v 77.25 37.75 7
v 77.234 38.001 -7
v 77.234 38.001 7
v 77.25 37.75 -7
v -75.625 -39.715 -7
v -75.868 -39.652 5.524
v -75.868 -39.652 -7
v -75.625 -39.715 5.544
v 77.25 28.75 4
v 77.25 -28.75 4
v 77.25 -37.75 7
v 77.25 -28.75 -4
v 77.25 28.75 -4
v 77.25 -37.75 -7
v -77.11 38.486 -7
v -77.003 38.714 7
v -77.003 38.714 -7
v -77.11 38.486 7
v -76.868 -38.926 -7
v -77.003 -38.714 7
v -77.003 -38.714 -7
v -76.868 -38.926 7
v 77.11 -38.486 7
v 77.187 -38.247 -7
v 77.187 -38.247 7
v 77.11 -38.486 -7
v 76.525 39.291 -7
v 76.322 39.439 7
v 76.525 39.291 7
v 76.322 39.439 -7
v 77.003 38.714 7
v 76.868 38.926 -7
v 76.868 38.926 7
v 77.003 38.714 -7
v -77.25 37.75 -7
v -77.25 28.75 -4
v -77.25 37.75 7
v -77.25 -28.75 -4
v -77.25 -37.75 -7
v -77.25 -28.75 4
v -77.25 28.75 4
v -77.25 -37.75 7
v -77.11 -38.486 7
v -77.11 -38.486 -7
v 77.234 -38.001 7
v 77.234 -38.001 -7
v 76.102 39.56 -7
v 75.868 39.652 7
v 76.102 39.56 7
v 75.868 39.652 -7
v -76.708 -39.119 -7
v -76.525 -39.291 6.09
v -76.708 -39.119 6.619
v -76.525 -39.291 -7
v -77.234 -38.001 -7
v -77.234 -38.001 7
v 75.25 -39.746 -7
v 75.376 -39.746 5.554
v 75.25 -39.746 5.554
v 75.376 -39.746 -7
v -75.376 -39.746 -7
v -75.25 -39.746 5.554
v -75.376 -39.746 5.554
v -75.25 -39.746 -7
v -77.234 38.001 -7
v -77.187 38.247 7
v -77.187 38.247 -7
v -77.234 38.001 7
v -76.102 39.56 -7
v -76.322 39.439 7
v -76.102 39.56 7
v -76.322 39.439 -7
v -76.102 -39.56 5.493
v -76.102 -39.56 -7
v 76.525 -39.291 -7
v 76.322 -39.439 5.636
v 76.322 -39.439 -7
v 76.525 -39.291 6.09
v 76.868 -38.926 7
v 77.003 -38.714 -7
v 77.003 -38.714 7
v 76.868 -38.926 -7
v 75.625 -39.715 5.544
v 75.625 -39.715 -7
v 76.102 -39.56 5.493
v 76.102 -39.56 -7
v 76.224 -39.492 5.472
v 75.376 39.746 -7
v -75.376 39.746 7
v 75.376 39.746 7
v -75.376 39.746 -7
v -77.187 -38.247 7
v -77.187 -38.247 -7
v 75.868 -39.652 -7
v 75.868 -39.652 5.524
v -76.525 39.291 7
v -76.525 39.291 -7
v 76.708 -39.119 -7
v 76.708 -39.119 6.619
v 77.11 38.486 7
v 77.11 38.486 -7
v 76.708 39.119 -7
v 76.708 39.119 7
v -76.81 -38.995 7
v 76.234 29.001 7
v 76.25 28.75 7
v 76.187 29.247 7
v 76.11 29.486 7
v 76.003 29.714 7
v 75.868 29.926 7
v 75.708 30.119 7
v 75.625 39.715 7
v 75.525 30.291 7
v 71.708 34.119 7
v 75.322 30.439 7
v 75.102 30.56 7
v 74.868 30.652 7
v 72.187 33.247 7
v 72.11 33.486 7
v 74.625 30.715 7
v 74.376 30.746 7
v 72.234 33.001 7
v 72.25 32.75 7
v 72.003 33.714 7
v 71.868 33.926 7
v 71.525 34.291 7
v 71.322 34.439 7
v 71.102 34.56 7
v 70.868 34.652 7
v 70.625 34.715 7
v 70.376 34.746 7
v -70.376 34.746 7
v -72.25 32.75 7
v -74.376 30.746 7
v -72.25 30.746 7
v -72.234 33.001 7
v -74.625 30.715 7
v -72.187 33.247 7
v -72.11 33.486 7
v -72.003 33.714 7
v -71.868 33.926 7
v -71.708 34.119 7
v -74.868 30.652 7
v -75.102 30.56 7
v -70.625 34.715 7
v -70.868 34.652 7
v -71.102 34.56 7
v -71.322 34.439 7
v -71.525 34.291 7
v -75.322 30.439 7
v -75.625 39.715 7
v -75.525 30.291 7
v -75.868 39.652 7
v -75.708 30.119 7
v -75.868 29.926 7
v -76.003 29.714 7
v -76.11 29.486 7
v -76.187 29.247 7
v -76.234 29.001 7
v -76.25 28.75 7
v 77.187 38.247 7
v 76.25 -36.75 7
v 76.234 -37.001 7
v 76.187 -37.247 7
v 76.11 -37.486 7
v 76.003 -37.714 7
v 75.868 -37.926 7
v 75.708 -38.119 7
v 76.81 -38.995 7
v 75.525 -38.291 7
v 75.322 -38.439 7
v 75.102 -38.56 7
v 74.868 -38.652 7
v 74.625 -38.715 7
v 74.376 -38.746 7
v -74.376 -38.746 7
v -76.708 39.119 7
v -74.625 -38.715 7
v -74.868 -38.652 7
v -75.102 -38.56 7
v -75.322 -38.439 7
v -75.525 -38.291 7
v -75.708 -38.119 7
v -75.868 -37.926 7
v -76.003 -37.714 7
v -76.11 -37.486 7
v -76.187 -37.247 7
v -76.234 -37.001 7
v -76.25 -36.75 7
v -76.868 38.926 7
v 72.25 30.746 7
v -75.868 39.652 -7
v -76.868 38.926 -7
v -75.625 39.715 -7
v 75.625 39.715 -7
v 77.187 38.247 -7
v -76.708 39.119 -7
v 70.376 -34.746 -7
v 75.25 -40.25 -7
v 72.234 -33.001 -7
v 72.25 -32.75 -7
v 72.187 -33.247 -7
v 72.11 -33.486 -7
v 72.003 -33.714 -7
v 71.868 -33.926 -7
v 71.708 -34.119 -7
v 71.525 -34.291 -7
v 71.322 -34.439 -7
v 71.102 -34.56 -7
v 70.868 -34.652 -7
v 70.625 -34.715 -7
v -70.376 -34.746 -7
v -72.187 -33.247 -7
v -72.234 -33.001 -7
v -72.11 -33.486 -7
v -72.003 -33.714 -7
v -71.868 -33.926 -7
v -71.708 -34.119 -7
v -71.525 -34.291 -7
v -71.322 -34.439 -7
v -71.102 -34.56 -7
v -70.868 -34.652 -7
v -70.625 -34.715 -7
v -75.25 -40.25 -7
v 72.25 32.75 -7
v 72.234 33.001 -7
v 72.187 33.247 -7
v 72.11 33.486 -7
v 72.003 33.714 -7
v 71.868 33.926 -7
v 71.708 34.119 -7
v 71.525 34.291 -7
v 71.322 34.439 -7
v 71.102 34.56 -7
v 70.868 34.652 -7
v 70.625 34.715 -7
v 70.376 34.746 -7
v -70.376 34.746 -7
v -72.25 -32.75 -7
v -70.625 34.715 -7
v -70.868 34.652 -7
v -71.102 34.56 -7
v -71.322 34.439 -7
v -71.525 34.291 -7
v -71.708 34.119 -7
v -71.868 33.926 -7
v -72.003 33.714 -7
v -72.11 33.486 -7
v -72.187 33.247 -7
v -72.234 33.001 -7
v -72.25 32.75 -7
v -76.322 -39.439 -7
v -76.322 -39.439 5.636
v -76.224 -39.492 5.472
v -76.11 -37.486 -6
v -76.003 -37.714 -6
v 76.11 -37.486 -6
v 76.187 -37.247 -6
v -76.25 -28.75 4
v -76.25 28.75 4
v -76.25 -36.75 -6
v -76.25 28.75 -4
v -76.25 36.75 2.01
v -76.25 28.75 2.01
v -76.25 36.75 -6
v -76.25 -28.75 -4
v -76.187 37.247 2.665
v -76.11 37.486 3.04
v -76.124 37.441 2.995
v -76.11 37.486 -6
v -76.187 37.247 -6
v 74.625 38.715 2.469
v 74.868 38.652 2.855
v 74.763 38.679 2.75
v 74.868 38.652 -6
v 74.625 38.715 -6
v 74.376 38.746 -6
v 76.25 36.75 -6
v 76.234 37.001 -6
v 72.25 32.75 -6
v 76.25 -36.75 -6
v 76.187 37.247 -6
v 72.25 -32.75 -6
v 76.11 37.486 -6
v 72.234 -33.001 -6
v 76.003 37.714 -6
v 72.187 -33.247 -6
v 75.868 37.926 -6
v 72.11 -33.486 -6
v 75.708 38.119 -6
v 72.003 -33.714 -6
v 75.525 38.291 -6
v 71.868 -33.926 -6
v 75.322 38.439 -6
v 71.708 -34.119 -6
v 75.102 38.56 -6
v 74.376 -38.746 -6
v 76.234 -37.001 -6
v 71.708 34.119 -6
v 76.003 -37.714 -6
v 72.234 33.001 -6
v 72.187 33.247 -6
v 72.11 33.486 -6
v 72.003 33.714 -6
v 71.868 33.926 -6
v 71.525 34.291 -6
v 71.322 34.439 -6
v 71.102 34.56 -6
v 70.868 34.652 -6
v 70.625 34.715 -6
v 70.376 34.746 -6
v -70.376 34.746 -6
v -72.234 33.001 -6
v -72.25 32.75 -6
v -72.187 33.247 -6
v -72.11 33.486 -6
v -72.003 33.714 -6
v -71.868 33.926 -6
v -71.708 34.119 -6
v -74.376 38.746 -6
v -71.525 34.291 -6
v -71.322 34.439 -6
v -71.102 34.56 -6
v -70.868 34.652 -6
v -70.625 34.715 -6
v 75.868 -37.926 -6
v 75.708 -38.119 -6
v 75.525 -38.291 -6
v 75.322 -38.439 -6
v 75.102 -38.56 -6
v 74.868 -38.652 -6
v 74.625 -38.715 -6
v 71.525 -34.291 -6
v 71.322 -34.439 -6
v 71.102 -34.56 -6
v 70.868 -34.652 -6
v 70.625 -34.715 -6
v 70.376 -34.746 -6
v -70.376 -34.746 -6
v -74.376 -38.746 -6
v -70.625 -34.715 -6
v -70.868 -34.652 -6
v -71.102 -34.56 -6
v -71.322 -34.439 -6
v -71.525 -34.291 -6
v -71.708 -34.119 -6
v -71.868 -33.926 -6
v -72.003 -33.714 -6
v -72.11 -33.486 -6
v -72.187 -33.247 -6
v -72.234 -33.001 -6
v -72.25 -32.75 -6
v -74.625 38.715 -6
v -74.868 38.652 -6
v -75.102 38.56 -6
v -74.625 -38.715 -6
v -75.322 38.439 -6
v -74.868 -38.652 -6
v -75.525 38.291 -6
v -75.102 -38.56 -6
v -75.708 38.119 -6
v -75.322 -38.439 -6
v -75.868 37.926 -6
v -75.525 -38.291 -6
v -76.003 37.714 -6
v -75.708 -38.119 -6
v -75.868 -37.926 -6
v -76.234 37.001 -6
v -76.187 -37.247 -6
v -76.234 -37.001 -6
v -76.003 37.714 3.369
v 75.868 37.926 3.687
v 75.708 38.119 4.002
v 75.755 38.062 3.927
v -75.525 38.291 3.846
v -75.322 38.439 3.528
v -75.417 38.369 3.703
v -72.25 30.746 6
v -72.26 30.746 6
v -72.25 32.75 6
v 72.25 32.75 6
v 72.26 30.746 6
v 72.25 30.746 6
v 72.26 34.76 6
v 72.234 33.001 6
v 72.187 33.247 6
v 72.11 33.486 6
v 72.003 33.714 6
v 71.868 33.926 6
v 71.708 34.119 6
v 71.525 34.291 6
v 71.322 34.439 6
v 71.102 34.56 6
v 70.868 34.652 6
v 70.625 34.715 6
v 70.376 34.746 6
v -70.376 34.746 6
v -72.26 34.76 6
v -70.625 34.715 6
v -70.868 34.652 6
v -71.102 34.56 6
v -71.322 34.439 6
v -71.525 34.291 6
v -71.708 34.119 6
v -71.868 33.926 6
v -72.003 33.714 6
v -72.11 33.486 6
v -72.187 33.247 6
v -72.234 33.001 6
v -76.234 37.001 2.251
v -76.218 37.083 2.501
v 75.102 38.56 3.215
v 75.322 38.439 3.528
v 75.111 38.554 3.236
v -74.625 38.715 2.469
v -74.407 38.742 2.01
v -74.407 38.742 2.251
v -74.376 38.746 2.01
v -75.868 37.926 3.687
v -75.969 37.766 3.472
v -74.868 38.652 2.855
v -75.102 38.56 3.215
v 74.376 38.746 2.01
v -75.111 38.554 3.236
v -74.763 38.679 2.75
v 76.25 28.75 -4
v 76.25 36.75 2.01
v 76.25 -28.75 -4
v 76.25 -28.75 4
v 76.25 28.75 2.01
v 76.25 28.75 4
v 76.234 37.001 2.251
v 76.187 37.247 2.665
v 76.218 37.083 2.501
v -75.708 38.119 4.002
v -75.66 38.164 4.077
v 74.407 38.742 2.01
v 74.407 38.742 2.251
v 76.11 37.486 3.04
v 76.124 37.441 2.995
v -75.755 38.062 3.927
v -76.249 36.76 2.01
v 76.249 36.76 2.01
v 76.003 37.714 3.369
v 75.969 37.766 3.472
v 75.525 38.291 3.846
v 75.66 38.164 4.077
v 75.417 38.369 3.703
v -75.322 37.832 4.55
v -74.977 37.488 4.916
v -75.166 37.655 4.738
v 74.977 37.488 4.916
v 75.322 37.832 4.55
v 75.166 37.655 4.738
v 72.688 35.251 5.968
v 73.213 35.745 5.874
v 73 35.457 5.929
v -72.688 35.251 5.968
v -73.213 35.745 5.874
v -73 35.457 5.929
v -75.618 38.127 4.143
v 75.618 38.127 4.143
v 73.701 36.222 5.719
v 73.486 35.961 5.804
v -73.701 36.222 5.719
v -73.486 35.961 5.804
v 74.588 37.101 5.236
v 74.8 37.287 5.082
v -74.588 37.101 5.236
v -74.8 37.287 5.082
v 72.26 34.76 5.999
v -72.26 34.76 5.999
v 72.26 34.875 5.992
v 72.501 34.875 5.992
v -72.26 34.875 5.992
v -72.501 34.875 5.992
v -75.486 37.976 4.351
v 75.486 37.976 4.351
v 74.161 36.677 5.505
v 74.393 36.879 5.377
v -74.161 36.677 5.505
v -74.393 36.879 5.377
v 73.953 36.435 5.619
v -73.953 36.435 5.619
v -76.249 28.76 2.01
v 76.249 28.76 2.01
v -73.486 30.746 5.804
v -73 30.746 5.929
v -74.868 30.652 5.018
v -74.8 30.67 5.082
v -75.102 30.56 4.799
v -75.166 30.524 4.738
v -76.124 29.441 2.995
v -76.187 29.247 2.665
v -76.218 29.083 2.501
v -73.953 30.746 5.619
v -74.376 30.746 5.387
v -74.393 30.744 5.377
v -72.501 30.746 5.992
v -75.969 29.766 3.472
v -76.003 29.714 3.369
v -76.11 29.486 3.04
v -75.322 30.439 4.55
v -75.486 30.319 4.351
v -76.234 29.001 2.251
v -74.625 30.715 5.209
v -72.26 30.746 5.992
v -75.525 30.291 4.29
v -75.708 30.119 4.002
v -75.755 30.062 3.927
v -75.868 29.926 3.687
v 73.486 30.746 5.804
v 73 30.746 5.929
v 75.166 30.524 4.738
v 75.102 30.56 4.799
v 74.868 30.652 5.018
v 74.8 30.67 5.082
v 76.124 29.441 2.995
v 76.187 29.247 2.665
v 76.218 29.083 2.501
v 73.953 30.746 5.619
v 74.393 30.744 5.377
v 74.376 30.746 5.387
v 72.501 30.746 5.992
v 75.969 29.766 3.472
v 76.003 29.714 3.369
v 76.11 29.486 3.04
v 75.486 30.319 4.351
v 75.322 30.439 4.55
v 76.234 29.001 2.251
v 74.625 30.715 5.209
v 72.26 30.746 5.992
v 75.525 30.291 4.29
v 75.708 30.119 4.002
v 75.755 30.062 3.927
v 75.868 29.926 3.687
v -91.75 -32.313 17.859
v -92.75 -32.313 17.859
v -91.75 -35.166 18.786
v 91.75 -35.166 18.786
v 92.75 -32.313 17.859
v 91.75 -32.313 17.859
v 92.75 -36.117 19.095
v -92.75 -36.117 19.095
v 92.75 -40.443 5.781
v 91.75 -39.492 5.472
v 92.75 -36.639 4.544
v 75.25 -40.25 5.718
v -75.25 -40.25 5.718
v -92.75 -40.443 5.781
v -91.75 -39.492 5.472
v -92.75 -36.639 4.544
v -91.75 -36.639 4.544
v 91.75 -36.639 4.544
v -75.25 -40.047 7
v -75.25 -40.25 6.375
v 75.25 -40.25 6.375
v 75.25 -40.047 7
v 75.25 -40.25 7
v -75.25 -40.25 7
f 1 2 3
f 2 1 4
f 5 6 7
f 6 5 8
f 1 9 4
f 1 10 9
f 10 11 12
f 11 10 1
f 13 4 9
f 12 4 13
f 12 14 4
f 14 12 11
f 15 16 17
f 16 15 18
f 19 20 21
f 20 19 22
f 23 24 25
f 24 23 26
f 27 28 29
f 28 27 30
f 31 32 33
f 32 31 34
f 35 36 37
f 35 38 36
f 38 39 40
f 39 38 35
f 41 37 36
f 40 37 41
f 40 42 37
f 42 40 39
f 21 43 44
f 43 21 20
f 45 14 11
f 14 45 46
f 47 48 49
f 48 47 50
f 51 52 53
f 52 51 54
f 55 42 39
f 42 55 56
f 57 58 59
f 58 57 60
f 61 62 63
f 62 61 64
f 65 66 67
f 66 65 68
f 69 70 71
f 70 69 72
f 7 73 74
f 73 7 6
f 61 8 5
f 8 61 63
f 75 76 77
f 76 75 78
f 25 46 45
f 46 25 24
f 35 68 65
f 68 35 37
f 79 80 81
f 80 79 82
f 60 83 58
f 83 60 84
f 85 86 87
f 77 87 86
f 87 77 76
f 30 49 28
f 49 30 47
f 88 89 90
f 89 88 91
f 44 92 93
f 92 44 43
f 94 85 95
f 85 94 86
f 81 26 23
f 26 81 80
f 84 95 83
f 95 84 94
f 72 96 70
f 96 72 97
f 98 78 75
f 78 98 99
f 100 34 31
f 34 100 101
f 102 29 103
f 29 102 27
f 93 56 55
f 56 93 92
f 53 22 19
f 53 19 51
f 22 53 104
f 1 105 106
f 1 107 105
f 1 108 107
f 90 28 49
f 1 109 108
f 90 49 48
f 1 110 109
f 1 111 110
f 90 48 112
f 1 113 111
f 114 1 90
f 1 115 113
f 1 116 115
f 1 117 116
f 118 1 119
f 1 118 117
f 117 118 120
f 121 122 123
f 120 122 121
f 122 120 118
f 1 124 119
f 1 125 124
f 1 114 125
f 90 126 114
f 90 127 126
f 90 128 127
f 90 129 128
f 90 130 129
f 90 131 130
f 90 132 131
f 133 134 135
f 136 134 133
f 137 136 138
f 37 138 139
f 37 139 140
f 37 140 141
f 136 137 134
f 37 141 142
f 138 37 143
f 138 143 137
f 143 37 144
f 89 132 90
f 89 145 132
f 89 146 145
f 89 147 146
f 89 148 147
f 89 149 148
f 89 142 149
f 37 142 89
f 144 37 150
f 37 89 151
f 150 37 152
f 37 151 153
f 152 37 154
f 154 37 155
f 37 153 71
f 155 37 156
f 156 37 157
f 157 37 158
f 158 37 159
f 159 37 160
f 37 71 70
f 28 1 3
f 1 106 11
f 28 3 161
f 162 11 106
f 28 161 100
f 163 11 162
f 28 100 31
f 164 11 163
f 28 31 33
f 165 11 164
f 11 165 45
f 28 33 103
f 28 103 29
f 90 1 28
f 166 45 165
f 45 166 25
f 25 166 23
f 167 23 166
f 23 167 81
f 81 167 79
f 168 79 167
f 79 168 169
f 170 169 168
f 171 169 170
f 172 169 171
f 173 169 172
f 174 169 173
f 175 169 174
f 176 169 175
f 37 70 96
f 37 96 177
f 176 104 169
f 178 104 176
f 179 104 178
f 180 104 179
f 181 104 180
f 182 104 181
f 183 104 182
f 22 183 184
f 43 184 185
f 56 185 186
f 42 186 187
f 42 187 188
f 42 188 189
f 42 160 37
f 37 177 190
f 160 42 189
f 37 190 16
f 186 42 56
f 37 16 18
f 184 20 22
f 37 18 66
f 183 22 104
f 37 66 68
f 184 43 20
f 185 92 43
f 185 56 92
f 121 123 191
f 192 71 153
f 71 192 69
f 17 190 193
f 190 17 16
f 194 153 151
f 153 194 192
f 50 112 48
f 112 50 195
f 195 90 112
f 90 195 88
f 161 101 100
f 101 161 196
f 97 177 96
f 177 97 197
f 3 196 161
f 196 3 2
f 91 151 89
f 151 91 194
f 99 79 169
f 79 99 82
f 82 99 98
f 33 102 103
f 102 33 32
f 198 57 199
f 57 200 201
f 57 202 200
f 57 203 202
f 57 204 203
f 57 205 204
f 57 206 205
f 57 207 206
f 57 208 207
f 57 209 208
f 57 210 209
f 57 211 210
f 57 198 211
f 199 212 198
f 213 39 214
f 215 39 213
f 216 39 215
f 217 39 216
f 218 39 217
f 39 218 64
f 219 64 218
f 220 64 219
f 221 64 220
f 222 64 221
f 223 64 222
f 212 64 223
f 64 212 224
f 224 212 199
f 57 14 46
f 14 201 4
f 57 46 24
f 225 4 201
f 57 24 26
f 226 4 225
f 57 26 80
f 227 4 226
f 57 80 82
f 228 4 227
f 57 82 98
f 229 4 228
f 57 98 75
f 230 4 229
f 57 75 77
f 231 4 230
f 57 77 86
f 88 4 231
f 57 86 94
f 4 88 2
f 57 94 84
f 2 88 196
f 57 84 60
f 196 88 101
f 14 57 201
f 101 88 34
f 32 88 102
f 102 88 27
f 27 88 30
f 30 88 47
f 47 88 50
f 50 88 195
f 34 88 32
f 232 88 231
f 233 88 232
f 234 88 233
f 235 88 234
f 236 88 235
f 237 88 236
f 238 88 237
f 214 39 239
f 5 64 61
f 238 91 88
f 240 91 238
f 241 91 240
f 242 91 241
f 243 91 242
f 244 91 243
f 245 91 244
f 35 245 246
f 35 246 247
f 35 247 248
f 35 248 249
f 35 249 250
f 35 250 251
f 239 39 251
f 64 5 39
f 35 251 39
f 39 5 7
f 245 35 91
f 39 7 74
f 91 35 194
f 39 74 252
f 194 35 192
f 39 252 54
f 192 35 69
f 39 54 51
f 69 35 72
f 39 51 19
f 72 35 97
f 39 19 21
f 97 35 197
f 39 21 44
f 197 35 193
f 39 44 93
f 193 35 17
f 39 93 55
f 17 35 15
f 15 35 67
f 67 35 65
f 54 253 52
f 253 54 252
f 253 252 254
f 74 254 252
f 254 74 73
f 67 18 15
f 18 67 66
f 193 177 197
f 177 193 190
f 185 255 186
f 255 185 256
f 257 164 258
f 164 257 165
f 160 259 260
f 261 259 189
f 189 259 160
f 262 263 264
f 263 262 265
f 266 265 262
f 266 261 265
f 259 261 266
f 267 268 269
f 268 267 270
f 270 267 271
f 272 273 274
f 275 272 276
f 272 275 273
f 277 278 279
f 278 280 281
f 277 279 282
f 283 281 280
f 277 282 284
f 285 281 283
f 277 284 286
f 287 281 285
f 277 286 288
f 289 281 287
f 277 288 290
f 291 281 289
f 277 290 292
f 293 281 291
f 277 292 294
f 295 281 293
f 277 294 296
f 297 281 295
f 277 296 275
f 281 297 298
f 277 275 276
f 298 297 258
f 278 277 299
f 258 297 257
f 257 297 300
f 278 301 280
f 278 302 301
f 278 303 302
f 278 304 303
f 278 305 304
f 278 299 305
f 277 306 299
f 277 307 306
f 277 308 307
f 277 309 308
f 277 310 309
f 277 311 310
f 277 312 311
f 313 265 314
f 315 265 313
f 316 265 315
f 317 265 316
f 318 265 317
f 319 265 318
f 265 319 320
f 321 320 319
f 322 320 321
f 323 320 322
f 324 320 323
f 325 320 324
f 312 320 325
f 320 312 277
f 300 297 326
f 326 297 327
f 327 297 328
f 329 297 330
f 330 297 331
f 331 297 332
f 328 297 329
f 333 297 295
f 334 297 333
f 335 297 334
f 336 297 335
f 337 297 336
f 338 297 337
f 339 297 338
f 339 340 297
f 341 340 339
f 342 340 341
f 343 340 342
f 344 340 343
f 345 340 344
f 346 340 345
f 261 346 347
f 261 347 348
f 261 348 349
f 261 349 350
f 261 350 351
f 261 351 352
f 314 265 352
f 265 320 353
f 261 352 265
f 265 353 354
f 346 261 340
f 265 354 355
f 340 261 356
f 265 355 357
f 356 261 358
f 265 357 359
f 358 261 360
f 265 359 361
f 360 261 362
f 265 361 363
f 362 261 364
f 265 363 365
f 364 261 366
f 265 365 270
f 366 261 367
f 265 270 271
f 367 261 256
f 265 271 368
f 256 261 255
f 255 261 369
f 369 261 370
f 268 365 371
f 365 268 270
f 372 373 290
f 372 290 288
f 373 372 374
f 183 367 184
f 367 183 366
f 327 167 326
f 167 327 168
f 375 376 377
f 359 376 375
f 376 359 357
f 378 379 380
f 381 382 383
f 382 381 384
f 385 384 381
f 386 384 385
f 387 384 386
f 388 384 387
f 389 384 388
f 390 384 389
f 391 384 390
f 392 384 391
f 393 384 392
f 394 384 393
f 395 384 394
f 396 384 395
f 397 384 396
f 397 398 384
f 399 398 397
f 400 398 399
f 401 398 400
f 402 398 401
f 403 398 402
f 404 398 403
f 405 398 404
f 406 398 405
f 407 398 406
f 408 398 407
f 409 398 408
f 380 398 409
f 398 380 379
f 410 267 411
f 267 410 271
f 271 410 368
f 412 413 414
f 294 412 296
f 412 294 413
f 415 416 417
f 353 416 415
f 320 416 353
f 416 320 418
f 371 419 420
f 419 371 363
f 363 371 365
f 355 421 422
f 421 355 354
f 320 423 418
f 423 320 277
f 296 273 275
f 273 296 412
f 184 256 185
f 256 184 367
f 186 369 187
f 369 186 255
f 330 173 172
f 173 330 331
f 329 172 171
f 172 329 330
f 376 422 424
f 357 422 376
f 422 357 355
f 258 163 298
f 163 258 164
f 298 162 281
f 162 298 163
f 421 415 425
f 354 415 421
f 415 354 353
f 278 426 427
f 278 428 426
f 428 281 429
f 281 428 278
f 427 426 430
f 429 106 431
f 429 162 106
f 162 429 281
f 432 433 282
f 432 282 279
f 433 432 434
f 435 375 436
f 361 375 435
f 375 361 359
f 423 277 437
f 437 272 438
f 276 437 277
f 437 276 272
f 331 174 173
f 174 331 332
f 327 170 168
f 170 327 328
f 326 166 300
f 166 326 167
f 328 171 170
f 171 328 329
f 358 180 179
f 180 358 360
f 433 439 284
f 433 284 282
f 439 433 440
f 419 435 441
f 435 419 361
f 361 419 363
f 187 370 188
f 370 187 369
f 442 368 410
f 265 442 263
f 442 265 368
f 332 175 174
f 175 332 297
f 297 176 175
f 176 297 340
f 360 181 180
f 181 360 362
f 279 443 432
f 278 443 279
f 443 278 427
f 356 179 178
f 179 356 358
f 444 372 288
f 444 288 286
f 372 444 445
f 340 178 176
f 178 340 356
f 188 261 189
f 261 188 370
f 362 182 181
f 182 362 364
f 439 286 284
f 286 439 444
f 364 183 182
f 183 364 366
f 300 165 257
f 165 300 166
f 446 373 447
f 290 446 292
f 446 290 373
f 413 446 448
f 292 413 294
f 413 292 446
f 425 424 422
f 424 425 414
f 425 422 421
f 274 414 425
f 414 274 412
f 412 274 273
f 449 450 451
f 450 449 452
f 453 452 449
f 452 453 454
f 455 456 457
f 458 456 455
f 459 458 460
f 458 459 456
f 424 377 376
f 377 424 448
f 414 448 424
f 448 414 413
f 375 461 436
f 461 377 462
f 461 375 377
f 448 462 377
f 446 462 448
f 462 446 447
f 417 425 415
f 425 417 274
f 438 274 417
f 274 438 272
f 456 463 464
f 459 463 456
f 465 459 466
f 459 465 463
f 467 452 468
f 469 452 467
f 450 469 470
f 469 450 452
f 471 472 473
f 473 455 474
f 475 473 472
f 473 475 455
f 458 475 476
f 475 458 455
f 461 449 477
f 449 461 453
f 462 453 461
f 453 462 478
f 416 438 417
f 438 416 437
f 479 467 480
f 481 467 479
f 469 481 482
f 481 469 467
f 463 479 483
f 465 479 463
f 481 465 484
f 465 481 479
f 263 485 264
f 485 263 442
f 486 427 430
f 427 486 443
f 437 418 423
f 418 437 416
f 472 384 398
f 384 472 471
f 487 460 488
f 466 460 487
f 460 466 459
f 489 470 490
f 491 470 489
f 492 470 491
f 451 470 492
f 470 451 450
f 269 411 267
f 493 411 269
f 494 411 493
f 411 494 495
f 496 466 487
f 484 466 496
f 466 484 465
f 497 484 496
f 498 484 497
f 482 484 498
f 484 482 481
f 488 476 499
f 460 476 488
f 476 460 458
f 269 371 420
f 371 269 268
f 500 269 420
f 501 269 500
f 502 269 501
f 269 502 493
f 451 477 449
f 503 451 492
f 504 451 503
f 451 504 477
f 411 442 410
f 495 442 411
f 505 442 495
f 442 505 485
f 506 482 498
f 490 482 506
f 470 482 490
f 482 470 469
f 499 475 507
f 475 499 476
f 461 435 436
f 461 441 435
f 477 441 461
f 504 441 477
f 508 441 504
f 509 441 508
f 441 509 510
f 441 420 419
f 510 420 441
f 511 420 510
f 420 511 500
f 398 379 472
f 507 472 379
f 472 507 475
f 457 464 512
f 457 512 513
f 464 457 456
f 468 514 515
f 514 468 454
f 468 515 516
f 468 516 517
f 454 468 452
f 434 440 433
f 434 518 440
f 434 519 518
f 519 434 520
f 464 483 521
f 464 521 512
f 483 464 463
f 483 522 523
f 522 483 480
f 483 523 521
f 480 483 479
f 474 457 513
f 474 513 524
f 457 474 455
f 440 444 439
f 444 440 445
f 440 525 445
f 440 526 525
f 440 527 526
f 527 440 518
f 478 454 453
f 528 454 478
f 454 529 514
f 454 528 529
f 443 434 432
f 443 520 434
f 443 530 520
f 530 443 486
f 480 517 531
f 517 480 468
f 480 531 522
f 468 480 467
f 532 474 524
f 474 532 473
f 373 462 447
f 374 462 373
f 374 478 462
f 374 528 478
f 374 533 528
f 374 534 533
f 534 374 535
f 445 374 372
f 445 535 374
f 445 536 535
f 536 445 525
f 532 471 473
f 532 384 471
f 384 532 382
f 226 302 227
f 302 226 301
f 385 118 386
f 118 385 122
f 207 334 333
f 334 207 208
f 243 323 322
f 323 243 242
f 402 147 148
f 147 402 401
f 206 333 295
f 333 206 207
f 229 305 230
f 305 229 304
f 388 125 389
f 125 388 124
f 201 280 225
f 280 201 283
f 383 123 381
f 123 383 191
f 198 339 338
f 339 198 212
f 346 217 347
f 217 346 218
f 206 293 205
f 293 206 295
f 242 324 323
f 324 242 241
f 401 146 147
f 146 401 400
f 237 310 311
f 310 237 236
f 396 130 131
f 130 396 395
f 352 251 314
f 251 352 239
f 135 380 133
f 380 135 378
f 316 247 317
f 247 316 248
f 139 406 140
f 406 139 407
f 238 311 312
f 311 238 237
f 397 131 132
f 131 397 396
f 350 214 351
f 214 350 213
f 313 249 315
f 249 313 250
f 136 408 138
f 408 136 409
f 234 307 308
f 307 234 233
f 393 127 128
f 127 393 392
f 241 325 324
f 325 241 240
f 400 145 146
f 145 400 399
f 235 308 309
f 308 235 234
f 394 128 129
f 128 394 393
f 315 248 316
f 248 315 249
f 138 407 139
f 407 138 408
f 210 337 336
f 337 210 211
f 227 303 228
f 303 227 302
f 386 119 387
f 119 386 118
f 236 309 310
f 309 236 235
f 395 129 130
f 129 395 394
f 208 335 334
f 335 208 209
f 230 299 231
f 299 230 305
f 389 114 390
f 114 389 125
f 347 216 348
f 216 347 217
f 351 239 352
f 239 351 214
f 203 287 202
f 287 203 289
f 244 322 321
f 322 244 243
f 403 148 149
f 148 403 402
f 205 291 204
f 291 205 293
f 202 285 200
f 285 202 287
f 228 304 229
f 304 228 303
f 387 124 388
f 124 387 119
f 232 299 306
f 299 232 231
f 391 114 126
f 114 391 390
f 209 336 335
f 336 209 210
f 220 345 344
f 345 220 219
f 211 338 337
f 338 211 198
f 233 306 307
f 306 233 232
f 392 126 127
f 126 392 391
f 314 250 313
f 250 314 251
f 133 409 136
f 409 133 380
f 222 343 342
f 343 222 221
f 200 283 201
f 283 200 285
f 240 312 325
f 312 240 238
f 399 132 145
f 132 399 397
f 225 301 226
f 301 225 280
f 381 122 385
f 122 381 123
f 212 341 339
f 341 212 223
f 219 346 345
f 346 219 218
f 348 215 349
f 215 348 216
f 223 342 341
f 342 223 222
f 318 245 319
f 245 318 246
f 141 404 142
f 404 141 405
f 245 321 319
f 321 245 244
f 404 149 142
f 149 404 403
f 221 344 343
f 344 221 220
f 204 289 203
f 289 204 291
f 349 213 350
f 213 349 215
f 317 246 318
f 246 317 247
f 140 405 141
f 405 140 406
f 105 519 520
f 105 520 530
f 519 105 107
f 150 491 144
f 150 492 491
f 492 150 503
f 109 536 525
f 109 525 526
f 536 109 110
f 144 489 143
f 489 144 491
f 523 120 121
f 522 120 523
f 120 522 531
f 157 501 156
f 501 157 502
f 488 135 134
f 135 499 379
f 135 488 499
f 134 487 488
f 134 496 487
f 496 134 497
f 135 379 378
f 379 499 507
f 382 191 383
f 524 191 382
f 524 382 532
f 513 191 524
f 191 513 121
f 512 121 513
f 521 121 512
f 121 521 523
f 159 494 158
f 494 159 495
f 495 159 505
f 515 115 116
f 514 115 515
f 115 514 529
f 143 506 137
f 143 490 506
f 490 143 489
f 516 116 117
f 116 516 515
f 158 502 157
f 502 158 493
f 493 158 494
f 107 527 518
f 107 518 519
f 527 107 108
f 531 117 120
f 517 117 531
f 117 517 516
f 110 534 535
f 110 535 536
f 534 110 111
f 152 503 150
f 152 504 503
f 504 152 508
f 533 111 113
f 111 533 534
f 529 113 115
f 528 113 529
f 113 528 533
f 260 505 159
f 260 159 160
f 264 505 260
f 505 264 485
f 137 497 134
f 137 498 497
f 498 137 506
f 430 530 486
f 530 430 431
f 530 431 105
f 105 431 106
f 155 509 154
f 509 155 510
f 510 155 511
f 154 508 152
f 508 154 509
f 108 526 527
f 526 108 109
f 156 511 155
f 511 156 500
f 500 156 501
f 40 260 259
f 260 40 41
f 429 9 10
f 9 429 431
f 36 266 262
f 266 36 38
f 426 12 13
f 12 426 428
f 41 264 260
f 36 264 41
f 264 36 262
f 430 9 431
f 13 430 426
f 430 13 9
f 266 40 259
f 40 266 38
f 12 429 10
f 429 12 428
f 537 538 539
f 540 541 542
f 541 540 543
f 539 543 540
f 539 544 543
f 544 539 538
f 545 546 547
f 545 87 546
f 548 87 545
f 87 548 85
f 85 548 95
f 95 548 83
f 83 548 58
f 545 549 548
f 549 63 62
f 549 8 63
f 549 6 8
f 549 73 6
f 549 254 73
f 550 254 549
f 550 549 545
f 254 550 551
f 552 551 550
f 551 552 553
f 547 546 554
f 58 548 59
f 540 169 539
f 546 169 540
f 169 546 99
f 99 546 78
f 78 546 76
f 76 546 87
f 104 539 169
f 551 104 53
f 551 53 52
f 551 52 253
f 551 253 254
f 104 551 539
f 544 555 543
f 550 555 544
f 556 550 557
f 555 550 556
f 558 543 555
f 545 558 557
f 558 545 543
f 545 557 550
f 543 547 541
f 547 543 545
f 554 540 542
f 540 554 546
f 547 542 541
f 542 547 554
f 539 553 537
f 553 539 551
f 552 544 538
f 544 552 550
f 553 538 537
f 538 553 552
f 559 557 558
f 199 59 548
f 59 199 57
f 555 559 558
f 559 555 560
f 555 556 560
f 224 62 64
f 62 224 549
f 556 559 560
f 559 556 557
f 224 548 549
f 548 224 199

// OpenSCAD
// file: ../../lib/utils.scad
// Cube with rounded corners
// roundedCornerCube (50,50,4);
module roundedCornerCube(length, width, thickness){

        hull()
        {
            translate([length/2 - 2, width/2 - 2, 0]) cylinder(r=2, h=thickness, $fn=50, center=true);
            translate([length/2 - 2, -width/2 + 2, 0]) cylinder(r=2, h=thickness, $fn=50, center=true);
            translate([-length/2 + 2, width/2 - 2, 0]) cylinder(r=2, h=thickness, $fn=50, center=true);
            translate([-length/2 + 2, -width/2 + 2, 0]) cylinder(r=2, h=thickness, $fn=50, center=true);
        }

}

// Hollow cube with rounded corners. Will look like a frame with rounded con
// hollowRoundedCornerCube(50,70,4,2);
module hollowRoundedCornerCube(length, width, thickness, wallthickness)
{
    difference()
    {
        roundedCornerCube(length,width,thickness);
        roundedCornerCube(length-(wallthickness*2),width-(wallthickness*2),thickness);
    }
}

/*
module cylinderWithHandle(radius, thickness)
{
    rotate_extrude($fn=100)
        polygon( points = [[0,0], [radius,0], [radius,thickness] , [1,thickness], [2,thickness + 2] , [2,thickness + 6],[0,thickness + 6]] );
}
*/


// hollow cylinder
// hollowCylinder(radius, height, wallThickness)
// radius : radius to outter wall
// wallThickness : Thickness of wall
module hollowCylinder(radius, height, wallThickness)
{

    difference()
    {
        cylinder(h=height, r1=radius, r2=radius);
        translate([0,0,-.02]) cylinder(h=height + .04, r1=radius - wallThickness, r2=radius - wallThickness);
    }
}


// hollow cylinders
// hollowCylinders(20, 10, 2, 2, 2)
// radius : radius to outer wall
// gapsSize : size of gap between each rings
// minradius : radius of the smallest ring
module hollowCylinders(radius, height, wallThickness, gapSize, minRadius)
{
    for (i = [radius : -(gapSize + wallThickness) : minRadius])
    {
       //echo (i);
       hollowCylinder(i,height,wallThickness);
    }
}

//
// b = bottom diameter
// t = top diameter
// h = height
module cone(b, t, h)
{
    cylinder(h=h, r1=b/2, r2=t/2, $fn=100);
}

// hollowCone(10,4,20, 2)
module hollowCone(bottomRadius, topRadius, height, wallThickness)
{
    difference()
    {
        cylinder(h=height, r1=bottomRadius, r2=topRadius, $fn=100);
        translate([0,0,-.02]) cylinder(h=height, r1=bottomRadius - wallThickness, r2=topRadius - wallThickness, $fn=100);
    }
}


// w = width between flat surface
// h = height
module hex (w=10, h=2){
  cylinder (r=w/2, h=h, center=true, $fn=6);
}

// hollowCone(10,4,20, 2)
module hollowHex(w=10, h=2, th=2)
{
    difference()
    {
        cylinder (r=w/2, h=h, center=true, $fn=6);
        cylinder (r=w/2 - th, h=h, center=true, $fn=6);
    }
}

// h : height
// ns : number of sides for base
// br : bottom radius
// tr : top radius
// ro : rotation in degree between bottom and top
// sl : slice layer. high value give smooth appearence
module twistExtrude(h=50,ns=6,br=20,tr=20,ro=100,sl=5)
{

	linear_extrude(height = h, twist  = ro,	slices = sl, scale  = tr/br)
		circle(r=br, $fn=ns);
}


// h : height
// ns : number of sides for base
// br : bottom radius
// tr : top radius
// ro : rotation in degree between bottom and top
// sl : slice layer. high value give smooth appearence
// wt : wall thickness
module hollowTwistExtrude(h=50,ns=6,br=20,tr=20,ro=100,sl=5,wt=1)
{
	difference()
	{
		linear_extrude(height = h, twist  = ro,	slices = sl, scale  = tr/br)
			circle(r=br, $fn=ns);

    translate([0,0,-.01])
		linear_extrude(height = h + .1, twist  = ro,	slices = sl, scale  = tr/br)
			circle(r=br - wt, $fn=ns);
	}
}


///////////////////////////////////////////////////////////////////////////////////////////////////////////////////

// honeycomb tiles
// honeycombSquare(100,100,4,10,2);
module honeycombTiles(length, width,thickness,rad,wallThickness)
{
    //thickness = 4;
    //rad = 10;
    //wallThickness = 2;
    //length = 100;
    //width = 100;

    for (w=[0: width/rad])
    {

        if (w % 2 == 0)
        {
            //cylinder($fn=6, r=rad, h=2);
            for (i = [0 : length/((rad*2) + (wallThickness*2))])
            {
              translate([rad*(3*i) + (wallThickness*2)*i,w*rad,0]) cylinder($fn=6, r=rad, h=thickness);

              //translate([rad*6 + (wallThickness*2)*2,0,0]) cylinder($fn=6, r=10, h=2);
              //translate([rad*9 + (wallThickness*2)*3,0,0]) cylinder($fn=6, r=10, h=2);
            }
        }

        if (w % 2 == 1)
        {
            for (j = [1 : 2 : (length/(rad + wallThickness))])
            {
              translate([(rad*1.5) *j + wallThickness *j , (w*rad) + wallThickness/2 ,0])  cylinder($fn=6, r=rad, h=thickness);
                //translate([(rad*1.5) *3 + wallThickness *3 ,10,0]) circle($fn=6, r=10);
                //translate([(rad*1.5) *5 + wallThickness *5 ,10,0]) circle($fn=6, r=10);
            }
        }
    }
}

// honeycomb square
// A square area with hollow honeycomb design
// honeycombSquare(100,100,4,10,2);
module honeycombSquare(length, width, thickness, cellRad,wallThickness)
{
    difference()
    {
        cube([length,width,thickness], center=true);
        translate([-length/2,-width/2, -thickness/2]) honeycombTiles(length,width,thickness,cellRad,wallThickness);
    }
}

//honeycomb(length, width, height, cell_size, wall_thickness);
//honeycomb(50, 50, 4, 10, 1);
//hollowRoundedCornerCube(50,70,4,2);

//hollowCylinder(10,20,2);

//hollowCylinders(20, 10, 2, 2, 2);
//cone(10,2,20);

// hollowCone(10,4,20, 2);

// honeycombSquare(40,40,2,5,2);


module edgeClamp(l=10)
{
   difference()
   {
    translate([0,.6,0]) rotate([45,0,0]) cube([l,2,2], center=true);
    translate([0,.6,1.5]) cube([l + .1,1,1], center=true);
    translate([0,.6,-1.5]) cube([l + .1,1,1], center=true);
   }
   cube([l,2,2], center=true);
}

cube([10,2,2], center=true);
translate([0,0,2]) edgeClamp();
// main file
use <../../lib/utils.scad>



l = 152.5; // length
w = 77.5; // width
h = 12; // height/thickness of phone
t = 2; // thickness of the sleve


module phone()
{
    roundedCornerCube(l, w, t);
}

// phone();

/*
translate([0,0,15])
union()
{
    difference()
    {
        cube([14 + 2,10,30] , center=true);
        translate([0,0,1]) cube([14 ,10 + 1,30] , center=true);
    }

    translate([-(14/2) - 2,0,-(15/2)])
    rotate([180,0,0])
    difference()
    {
        cube([2 + 2,10,15] , center=true);
        translate([0,0,1]) cube([2 ,10 + 1,15] , center=true);
    }
}
*/

/*
difference()
{
*/

union()
 {

    difference()
    {
     union()
     {
        difference()
        {
            roundedCornerCube(l + t, w + t, h + t);
            roundedCornerCube(l, w, h);
        }

        //top
        translate([0,w/2 - 4,h/2 - 4])
         rotate([0,90,0])
         difference()
         {
            cube([8,8,l], center=true);
            translate([0,0,-l/2]) cylinder(r1=4,r2=4,h=l,$fn=50);
            translate([4,0,0]) cube([8.02,8.02,l + 1], center=true);
            translate([0,-4,0]) cube([8.02,8.02,l + 1], center=true);
         }

         //bottom
         translate([0,-w/2 + 4,h/2 - 4])
         rotate([0,90,180])
         difference()
         {
            cube([8,8,l], center=true);
            translate([0,0,-l/2]) cylinder(r1=4,r2=4,h=l,$fn=50);
            translate([4,0,0]) cube([8.02,8.02,l + 1], center=true);
            translate([0,-4,0]) cube([8.02,8.02,l + 1], center=true);
         }

         // left
         translate([-l/2 + 4,0,h/2 - 4])
         rotate([90,0,0])
         difference()
         {
            cube([8,8,w], center=true);
            translate([0,0,-w/2]) cylinder(r1=4,r2=4,h=w,$fn=50);
            translate([4,0,0]) cube([8.02,8.02,w + 1], center=true);
            translate([0,-4,0]) cube([8.02,8.02,w + 1], center=true);
         }

         // right
        translate([l/2 - 4,0,h/2 - 4])
        rotate([90,0,180])
         difference()
         {
            cube([8,8,w], center=true);
            translate([0,0,-w/2]) cylinder(r1=4,r2=4,h=w,$fn=50);
            translate([4,0,0]) cube([8.02,8.02,w + 1], center=true);
            translate([0,-4,0]) cube([8.02,8.02,w + 1], center=true);
         }
        }

        // big hole
        roundedCornerCube(l-8,w-8,h + 3);

        translate([0,-8/2,t]) roundedCornerCube(l,w-8,h + 3);

        // through sides
        translate([0,0,0]) cube([l+10, w -20,8], center=true);

    }

 }

module hanger()
{
  translate([0,-w/2 - 1,0]) cube([l + t + 30, t/2, h+t], center=true);
  translate([(l + t + 30)/2,-w/2 + .5,0]) cube([1,4,h+t],center=true);
  translate([-(l + t + 30)/2,-w/2 + .5,0]) cube([1,4,h+t],center=true);
}

rotate([-18,0,0]) hanger();
translate([0,-w/2 - 1,0]) cube([l - t, t/2, h+t], center=true);
 /*
    translate([0,-10,0]) cube([160, 60, 15], center=true);
}
   translate([-152.5/2 + 1.5,20.2,0]) cube([5,.4,13],center=true);
   translate([152.5/2 - 1.5,20.2,0]) cube([5,.4,13],center=true);
 */
